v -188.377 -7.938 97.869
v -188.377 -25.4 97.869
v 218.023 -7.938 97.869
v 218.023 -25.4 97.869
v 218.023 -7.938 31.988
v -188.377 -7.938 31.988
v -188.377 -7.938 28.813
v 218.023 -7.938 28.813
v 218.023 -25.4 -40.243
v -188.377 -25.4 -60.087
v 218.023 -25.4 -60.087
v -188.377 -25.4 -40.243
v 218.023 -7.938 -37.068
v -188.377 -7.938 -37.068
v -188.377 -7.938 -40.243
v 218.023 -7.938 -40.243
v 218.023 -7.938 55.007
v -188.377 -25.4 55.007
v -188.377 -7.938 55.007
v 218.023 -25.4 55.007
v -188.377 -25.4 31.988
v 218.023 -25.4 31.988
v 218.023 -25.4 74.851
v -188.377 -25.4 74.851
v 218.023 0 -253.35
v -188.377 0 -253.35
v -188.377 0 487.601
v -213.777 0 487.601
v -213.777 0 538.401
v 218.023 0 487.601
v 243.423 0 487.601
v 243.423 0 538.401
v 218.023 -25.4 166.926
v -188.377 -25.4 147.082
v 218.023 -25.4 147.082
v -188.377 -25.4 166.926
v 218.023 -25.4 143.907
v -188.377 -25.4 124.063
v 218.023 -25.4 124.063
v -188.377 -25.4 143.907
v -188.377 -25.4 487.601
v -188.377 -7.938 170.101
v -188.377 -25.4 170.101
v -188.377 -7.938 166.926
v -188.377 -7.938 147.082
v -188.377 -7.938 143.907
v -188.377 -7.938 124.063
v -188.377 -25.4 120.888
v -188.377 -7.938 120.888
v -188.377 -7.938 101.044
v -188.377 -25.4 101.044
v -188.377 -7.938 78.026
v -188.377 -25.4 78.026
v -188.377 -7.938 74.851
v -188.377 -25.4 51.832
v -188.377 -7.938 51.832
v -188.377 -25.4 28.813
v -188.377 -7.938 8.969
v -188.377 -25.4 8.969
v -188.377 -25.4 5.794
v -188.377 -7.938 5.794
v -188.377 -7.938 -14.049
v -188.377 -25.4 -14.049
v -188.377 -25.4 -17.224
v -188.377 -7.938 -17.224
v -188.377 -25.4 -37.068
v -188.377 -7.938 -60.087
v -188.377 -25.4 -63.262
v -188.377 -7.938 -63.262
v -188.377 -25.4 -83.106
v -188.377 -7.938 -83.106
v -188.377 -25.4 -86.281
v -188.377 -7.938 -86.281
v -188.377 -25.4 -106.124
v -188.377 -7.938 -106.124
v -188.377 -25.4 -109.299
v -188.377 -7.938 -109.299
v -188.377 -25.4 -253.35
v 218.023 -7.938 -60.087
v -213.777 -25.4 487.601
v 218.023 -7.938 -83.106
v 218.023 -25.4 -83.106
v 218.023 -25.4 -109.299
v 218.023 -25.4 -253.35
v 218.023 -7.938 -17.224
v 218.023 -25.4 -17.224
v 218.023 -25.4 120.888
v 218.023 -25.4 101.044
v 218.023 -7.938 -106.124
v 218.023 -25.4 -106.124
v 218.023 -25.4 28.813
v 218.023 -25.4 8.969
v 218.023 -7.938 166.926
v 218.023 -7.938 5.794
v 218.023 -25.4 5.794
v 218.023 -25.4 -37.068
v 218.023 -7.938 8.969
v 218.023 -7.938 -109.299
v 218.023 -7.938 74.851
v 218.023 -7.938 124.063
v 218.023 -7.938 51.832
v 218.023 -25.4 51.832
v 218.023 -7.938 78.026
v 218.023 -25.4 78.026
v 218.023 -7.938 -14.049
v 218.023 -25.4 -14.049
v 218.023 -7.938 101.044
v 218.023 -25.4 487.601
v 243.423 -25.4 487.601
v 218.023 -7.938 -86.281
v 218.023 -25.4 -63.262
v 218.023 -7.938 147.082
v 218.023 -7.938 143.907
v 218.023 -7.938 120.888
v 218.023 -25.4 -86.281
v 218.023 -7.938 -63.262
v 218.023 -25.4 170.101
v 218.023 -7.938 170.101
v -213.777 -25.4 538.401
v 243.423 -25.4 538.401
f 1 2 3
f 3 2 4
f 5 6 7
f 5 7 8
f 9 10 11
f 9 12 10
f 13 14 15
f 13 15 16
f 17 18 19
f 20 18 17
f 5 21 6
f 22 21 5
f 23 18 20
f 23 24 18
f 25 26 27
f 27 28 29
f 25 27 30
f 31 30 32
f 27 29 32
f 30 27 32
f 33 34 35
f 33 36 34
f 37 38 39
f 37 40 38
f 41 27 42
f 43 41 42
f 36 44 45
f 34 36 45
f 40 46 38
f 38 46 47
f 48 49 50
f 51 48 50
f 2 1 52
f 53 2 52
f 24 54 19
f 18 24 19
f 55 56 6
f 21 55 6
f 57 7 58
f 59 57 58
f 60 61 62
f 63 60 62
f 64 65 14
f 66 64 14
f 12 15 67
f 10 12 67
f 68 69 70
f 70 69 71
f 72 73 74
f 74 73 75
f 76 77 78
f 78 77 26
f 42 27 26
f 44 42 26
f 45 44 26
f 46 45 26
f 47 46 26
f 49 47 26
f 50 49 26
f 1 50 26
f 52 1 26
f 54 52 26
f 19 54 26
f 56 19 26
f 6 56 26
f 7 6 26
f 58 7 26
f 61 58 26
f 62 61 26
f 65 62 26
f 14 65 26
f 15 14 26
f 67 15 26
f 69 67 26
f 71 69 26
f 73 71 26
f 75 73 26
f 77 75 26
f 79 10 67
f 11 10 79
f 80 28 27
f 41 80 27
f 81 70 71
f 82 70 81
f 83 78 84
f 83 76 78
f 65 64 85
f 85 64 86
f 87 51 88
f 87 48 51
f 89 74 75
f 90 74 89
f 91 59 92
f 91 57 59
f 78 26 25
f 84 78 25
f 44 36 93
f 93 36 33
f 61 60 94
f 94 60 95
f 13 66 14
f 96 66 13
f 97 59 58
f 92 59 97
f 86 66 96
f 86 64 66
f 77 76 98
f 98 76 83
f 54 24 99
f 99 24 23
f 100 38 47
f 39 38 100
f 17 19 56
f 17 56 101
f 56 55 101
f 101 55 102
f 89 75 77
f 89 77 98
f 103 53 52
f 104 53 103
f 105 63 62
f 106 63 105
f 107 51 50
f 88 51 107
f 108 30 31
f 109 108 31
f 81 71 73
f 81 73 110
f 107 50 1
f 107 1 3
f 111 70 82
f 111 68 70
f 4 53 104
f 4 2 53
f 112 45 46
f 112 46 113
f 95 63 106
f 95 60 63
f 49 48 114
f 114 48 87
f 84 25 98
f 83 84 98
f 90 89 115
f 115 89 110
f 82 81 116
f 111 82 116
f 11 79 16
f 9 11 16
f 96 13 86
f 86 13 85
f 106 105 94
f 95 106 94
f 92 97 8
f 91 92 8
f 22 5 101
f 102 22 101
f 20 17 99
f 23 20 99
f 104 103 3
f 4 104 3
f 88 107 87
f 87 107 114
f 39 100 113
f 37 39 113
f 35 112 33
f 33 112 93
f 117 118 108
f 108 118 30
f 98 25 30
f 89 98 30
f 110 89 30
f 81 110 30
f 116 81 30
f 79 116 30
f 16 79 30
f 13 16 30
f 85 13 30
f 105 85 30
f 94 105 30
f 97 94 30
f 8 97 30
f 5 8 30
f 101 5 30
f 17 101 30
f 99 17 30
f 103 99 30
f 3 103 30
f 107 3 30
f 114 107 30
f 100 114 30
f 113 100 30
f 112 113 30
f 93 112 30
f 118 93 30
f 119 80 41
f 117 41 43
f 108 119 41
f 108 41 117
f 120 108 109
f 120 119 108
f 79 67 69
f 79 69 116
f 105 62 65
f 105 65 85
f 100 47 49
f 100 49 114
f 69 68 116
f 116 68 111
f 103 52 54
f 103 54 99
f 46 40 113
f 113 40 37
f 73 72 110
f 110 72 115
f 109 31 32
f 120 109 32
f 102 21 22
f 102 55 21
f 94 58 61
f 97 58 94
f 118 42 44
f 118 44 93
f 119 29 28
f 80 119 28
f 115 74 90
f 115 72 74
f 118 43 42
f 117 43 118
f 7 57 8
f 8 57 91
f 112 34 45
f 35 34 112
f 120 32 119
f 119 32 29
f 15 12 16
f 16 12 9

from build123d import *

# Parameters (mm, degrees)
F1_DEPTH = 25.4
F2_W     = 406.4
F2_H     = 3.175
F3_DEPTH = 17.4625


# Not quite as in the source:
# - a feature names something its author has since deleted; it is built from what else it names


with BuildPart() as f1:
    # F0 (on Front) → F1 (new body)
    with BuildSketch(Plane.XZ):
        Polygon((218.0226445198, -253.3499094963), (218.0226445198, 487.6006533037), (243.4226445198, 487.6006533037), (243.4226445198, 538.4006533037), (-213.7773554802, 538.4006533037), (-213.7773554802, 487.6006533037), (-188.3773554802, 487.6006533037), (-188.3773554802, -253.3499094963), align=None)
    extrude(amount=F1_DEPTH)

    # F2 (on face) → F3 (cut)
    with BuildSketch(Plane.XZ.offset(25.4)):
        with Locations((14.8226445198, 168.5131533037)):
            Rectangle(F2_W, F2_H)
        with Locations((14.8226445198, 145.4944033037)):
            Rectangle(F2_W, F2_H)
        with Locations((14.8226445198, 122.4756533037)):
            Rectangle(F2_W, F2_H)
        with Locations((14.8226445198, 7.3819033037)):
            Rectangle(F2_W, F2_H)
        with Locations((14.8226445198, 76.4381533037)):
            Rectangle(F2_W, F2_H)
        with Locations((14.8226445198, 53.4194033037)):
            Rectangle(F2_W, F2_H)
        with Locations((14.8226445198, 99.4569033037)):
            Rectangle(F2_W, F2_H)
        with Locations((14.8226445198, 30.4006533037)):
            Rectangle(F2_W, F2_H)
        with Locations((14.8226445198, -15.6368466963)):
            Rectangle(F2_W, F2_H)
        with Locations((14.8226445198, -38.6555966963)):
            Rectangle(F2_W, F2_H)
        with Locations((14.8226445198, -61.6743466963)):
            Rectangle(F2_W, F2_H)
        with Locations((14.8226445198, -84.6930966963)):
            Rectangle(F2_W, F2_H)
        with Locations((14.8226445198, -107.7118466963)):
            Rectangle(F2_W, F2_H)
    extrude(amount=-F3_DEPTH, mode=Mode.SUBTRACT)


solid = f1.part
